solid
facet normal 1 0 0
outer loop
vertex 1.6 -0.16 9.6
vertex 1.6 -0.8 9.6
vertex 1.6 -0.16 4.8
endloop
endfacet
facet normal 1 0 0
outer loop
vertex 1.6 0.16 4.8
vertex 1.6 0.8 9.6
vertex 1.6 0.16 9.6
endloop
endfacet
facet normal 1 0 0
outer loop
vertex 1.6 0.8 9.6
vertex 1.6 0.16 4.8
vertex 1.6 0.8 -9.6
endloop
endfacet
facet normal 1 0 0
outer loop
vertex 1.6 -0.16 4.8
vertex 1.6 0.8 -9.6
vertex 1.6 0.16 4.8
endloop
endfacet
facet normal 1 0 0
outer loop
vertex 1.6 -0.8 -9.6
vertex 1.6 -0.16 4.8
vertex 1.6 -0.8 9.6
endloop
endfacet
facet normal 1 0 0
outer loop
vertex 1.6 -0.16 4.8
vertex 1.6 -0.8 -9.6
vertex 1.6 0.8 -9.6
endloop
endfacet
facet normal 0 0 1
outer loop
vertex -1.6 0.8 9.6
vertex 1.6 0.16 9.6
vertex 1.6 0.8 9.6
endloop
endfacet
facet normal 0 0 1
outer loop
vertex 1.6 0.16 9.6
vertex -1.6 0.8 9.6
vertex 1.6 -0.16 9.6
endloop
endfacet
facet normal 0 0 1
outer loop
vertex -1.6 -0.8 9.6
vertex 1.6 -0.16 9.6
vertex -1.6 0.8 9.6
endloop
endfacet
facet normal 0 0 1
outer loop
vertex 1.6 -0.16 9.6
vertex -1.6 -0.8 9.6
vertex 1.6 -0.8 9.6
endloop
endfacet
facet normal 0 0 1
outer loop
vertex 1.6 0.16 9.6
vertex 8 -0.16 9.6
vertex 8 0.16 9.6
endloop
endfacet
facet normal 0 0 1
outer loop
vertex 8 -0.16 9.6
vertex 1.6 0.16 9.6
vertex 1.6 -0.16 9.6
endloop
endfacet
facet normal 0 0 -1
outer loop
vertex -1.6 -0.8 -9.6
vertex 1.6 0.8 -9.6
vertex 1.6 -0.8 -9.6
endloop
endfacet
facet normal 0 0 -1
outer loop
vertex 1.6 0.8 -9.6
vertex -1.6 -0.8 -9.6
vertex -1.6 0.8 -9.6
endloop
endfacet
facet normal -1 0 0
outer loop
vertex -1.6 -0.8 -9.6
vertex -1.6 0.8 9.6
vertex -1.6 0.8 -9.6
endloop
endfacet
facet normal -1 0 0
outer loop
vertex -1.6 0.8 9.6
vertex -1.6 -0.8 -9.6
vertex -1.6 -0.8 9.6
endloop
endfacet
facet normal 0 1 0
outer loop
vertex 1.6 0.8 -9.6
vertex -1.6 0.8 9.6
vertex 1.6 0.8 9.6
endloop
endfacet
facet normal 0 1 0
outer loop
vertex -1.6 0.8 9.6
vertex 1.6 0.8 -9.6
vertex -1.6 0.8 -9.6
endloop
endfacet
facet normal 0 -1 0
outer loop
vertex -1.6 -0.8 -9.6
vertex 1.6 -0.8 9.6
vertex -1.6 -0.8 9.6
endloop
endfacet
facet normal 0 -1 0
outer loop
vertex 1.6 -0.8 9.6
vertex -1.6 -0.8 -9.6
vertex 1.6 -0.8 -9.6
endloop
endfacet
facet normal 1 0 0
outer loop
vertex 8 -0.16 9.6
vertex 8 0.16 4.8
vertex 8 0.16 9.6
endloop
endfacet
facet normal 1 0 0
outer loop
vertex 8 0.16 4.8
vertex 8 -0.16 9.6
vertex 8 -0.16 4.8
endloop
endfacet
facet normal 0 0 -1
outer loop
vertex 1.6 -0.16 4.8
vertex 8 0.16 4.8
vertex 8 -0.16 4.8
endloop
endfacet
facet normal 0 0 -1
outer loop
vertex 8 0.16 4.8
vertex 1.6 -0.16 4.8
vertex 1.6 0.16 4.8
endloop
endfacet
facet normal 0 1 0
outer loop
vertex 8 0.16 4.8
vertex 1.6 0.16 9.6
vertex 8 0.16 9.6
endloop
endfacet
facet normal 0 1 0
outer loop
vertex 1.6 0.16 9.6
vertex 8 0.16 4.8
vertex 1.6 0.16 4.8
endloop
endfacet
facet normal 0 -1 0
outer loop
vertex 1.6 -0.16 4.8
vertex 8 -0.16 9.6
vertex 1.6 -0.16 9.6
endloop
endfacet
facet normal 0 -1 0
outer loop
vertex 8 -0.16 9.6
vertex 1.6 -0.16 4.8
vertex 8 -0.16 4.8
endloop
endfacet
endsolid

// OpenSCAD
size = 32;//block=32 //item=8

cube([size * 0.10, size * 0.05, size * 0.60], center = true);
translate([size * 0.1, 0, (((size * 0.60) / 2) - ((size * 0.15) / 2))]) {
  cube([size * 0.3, size * 0.01, size * 0.15], center = true);
}
;//translate
